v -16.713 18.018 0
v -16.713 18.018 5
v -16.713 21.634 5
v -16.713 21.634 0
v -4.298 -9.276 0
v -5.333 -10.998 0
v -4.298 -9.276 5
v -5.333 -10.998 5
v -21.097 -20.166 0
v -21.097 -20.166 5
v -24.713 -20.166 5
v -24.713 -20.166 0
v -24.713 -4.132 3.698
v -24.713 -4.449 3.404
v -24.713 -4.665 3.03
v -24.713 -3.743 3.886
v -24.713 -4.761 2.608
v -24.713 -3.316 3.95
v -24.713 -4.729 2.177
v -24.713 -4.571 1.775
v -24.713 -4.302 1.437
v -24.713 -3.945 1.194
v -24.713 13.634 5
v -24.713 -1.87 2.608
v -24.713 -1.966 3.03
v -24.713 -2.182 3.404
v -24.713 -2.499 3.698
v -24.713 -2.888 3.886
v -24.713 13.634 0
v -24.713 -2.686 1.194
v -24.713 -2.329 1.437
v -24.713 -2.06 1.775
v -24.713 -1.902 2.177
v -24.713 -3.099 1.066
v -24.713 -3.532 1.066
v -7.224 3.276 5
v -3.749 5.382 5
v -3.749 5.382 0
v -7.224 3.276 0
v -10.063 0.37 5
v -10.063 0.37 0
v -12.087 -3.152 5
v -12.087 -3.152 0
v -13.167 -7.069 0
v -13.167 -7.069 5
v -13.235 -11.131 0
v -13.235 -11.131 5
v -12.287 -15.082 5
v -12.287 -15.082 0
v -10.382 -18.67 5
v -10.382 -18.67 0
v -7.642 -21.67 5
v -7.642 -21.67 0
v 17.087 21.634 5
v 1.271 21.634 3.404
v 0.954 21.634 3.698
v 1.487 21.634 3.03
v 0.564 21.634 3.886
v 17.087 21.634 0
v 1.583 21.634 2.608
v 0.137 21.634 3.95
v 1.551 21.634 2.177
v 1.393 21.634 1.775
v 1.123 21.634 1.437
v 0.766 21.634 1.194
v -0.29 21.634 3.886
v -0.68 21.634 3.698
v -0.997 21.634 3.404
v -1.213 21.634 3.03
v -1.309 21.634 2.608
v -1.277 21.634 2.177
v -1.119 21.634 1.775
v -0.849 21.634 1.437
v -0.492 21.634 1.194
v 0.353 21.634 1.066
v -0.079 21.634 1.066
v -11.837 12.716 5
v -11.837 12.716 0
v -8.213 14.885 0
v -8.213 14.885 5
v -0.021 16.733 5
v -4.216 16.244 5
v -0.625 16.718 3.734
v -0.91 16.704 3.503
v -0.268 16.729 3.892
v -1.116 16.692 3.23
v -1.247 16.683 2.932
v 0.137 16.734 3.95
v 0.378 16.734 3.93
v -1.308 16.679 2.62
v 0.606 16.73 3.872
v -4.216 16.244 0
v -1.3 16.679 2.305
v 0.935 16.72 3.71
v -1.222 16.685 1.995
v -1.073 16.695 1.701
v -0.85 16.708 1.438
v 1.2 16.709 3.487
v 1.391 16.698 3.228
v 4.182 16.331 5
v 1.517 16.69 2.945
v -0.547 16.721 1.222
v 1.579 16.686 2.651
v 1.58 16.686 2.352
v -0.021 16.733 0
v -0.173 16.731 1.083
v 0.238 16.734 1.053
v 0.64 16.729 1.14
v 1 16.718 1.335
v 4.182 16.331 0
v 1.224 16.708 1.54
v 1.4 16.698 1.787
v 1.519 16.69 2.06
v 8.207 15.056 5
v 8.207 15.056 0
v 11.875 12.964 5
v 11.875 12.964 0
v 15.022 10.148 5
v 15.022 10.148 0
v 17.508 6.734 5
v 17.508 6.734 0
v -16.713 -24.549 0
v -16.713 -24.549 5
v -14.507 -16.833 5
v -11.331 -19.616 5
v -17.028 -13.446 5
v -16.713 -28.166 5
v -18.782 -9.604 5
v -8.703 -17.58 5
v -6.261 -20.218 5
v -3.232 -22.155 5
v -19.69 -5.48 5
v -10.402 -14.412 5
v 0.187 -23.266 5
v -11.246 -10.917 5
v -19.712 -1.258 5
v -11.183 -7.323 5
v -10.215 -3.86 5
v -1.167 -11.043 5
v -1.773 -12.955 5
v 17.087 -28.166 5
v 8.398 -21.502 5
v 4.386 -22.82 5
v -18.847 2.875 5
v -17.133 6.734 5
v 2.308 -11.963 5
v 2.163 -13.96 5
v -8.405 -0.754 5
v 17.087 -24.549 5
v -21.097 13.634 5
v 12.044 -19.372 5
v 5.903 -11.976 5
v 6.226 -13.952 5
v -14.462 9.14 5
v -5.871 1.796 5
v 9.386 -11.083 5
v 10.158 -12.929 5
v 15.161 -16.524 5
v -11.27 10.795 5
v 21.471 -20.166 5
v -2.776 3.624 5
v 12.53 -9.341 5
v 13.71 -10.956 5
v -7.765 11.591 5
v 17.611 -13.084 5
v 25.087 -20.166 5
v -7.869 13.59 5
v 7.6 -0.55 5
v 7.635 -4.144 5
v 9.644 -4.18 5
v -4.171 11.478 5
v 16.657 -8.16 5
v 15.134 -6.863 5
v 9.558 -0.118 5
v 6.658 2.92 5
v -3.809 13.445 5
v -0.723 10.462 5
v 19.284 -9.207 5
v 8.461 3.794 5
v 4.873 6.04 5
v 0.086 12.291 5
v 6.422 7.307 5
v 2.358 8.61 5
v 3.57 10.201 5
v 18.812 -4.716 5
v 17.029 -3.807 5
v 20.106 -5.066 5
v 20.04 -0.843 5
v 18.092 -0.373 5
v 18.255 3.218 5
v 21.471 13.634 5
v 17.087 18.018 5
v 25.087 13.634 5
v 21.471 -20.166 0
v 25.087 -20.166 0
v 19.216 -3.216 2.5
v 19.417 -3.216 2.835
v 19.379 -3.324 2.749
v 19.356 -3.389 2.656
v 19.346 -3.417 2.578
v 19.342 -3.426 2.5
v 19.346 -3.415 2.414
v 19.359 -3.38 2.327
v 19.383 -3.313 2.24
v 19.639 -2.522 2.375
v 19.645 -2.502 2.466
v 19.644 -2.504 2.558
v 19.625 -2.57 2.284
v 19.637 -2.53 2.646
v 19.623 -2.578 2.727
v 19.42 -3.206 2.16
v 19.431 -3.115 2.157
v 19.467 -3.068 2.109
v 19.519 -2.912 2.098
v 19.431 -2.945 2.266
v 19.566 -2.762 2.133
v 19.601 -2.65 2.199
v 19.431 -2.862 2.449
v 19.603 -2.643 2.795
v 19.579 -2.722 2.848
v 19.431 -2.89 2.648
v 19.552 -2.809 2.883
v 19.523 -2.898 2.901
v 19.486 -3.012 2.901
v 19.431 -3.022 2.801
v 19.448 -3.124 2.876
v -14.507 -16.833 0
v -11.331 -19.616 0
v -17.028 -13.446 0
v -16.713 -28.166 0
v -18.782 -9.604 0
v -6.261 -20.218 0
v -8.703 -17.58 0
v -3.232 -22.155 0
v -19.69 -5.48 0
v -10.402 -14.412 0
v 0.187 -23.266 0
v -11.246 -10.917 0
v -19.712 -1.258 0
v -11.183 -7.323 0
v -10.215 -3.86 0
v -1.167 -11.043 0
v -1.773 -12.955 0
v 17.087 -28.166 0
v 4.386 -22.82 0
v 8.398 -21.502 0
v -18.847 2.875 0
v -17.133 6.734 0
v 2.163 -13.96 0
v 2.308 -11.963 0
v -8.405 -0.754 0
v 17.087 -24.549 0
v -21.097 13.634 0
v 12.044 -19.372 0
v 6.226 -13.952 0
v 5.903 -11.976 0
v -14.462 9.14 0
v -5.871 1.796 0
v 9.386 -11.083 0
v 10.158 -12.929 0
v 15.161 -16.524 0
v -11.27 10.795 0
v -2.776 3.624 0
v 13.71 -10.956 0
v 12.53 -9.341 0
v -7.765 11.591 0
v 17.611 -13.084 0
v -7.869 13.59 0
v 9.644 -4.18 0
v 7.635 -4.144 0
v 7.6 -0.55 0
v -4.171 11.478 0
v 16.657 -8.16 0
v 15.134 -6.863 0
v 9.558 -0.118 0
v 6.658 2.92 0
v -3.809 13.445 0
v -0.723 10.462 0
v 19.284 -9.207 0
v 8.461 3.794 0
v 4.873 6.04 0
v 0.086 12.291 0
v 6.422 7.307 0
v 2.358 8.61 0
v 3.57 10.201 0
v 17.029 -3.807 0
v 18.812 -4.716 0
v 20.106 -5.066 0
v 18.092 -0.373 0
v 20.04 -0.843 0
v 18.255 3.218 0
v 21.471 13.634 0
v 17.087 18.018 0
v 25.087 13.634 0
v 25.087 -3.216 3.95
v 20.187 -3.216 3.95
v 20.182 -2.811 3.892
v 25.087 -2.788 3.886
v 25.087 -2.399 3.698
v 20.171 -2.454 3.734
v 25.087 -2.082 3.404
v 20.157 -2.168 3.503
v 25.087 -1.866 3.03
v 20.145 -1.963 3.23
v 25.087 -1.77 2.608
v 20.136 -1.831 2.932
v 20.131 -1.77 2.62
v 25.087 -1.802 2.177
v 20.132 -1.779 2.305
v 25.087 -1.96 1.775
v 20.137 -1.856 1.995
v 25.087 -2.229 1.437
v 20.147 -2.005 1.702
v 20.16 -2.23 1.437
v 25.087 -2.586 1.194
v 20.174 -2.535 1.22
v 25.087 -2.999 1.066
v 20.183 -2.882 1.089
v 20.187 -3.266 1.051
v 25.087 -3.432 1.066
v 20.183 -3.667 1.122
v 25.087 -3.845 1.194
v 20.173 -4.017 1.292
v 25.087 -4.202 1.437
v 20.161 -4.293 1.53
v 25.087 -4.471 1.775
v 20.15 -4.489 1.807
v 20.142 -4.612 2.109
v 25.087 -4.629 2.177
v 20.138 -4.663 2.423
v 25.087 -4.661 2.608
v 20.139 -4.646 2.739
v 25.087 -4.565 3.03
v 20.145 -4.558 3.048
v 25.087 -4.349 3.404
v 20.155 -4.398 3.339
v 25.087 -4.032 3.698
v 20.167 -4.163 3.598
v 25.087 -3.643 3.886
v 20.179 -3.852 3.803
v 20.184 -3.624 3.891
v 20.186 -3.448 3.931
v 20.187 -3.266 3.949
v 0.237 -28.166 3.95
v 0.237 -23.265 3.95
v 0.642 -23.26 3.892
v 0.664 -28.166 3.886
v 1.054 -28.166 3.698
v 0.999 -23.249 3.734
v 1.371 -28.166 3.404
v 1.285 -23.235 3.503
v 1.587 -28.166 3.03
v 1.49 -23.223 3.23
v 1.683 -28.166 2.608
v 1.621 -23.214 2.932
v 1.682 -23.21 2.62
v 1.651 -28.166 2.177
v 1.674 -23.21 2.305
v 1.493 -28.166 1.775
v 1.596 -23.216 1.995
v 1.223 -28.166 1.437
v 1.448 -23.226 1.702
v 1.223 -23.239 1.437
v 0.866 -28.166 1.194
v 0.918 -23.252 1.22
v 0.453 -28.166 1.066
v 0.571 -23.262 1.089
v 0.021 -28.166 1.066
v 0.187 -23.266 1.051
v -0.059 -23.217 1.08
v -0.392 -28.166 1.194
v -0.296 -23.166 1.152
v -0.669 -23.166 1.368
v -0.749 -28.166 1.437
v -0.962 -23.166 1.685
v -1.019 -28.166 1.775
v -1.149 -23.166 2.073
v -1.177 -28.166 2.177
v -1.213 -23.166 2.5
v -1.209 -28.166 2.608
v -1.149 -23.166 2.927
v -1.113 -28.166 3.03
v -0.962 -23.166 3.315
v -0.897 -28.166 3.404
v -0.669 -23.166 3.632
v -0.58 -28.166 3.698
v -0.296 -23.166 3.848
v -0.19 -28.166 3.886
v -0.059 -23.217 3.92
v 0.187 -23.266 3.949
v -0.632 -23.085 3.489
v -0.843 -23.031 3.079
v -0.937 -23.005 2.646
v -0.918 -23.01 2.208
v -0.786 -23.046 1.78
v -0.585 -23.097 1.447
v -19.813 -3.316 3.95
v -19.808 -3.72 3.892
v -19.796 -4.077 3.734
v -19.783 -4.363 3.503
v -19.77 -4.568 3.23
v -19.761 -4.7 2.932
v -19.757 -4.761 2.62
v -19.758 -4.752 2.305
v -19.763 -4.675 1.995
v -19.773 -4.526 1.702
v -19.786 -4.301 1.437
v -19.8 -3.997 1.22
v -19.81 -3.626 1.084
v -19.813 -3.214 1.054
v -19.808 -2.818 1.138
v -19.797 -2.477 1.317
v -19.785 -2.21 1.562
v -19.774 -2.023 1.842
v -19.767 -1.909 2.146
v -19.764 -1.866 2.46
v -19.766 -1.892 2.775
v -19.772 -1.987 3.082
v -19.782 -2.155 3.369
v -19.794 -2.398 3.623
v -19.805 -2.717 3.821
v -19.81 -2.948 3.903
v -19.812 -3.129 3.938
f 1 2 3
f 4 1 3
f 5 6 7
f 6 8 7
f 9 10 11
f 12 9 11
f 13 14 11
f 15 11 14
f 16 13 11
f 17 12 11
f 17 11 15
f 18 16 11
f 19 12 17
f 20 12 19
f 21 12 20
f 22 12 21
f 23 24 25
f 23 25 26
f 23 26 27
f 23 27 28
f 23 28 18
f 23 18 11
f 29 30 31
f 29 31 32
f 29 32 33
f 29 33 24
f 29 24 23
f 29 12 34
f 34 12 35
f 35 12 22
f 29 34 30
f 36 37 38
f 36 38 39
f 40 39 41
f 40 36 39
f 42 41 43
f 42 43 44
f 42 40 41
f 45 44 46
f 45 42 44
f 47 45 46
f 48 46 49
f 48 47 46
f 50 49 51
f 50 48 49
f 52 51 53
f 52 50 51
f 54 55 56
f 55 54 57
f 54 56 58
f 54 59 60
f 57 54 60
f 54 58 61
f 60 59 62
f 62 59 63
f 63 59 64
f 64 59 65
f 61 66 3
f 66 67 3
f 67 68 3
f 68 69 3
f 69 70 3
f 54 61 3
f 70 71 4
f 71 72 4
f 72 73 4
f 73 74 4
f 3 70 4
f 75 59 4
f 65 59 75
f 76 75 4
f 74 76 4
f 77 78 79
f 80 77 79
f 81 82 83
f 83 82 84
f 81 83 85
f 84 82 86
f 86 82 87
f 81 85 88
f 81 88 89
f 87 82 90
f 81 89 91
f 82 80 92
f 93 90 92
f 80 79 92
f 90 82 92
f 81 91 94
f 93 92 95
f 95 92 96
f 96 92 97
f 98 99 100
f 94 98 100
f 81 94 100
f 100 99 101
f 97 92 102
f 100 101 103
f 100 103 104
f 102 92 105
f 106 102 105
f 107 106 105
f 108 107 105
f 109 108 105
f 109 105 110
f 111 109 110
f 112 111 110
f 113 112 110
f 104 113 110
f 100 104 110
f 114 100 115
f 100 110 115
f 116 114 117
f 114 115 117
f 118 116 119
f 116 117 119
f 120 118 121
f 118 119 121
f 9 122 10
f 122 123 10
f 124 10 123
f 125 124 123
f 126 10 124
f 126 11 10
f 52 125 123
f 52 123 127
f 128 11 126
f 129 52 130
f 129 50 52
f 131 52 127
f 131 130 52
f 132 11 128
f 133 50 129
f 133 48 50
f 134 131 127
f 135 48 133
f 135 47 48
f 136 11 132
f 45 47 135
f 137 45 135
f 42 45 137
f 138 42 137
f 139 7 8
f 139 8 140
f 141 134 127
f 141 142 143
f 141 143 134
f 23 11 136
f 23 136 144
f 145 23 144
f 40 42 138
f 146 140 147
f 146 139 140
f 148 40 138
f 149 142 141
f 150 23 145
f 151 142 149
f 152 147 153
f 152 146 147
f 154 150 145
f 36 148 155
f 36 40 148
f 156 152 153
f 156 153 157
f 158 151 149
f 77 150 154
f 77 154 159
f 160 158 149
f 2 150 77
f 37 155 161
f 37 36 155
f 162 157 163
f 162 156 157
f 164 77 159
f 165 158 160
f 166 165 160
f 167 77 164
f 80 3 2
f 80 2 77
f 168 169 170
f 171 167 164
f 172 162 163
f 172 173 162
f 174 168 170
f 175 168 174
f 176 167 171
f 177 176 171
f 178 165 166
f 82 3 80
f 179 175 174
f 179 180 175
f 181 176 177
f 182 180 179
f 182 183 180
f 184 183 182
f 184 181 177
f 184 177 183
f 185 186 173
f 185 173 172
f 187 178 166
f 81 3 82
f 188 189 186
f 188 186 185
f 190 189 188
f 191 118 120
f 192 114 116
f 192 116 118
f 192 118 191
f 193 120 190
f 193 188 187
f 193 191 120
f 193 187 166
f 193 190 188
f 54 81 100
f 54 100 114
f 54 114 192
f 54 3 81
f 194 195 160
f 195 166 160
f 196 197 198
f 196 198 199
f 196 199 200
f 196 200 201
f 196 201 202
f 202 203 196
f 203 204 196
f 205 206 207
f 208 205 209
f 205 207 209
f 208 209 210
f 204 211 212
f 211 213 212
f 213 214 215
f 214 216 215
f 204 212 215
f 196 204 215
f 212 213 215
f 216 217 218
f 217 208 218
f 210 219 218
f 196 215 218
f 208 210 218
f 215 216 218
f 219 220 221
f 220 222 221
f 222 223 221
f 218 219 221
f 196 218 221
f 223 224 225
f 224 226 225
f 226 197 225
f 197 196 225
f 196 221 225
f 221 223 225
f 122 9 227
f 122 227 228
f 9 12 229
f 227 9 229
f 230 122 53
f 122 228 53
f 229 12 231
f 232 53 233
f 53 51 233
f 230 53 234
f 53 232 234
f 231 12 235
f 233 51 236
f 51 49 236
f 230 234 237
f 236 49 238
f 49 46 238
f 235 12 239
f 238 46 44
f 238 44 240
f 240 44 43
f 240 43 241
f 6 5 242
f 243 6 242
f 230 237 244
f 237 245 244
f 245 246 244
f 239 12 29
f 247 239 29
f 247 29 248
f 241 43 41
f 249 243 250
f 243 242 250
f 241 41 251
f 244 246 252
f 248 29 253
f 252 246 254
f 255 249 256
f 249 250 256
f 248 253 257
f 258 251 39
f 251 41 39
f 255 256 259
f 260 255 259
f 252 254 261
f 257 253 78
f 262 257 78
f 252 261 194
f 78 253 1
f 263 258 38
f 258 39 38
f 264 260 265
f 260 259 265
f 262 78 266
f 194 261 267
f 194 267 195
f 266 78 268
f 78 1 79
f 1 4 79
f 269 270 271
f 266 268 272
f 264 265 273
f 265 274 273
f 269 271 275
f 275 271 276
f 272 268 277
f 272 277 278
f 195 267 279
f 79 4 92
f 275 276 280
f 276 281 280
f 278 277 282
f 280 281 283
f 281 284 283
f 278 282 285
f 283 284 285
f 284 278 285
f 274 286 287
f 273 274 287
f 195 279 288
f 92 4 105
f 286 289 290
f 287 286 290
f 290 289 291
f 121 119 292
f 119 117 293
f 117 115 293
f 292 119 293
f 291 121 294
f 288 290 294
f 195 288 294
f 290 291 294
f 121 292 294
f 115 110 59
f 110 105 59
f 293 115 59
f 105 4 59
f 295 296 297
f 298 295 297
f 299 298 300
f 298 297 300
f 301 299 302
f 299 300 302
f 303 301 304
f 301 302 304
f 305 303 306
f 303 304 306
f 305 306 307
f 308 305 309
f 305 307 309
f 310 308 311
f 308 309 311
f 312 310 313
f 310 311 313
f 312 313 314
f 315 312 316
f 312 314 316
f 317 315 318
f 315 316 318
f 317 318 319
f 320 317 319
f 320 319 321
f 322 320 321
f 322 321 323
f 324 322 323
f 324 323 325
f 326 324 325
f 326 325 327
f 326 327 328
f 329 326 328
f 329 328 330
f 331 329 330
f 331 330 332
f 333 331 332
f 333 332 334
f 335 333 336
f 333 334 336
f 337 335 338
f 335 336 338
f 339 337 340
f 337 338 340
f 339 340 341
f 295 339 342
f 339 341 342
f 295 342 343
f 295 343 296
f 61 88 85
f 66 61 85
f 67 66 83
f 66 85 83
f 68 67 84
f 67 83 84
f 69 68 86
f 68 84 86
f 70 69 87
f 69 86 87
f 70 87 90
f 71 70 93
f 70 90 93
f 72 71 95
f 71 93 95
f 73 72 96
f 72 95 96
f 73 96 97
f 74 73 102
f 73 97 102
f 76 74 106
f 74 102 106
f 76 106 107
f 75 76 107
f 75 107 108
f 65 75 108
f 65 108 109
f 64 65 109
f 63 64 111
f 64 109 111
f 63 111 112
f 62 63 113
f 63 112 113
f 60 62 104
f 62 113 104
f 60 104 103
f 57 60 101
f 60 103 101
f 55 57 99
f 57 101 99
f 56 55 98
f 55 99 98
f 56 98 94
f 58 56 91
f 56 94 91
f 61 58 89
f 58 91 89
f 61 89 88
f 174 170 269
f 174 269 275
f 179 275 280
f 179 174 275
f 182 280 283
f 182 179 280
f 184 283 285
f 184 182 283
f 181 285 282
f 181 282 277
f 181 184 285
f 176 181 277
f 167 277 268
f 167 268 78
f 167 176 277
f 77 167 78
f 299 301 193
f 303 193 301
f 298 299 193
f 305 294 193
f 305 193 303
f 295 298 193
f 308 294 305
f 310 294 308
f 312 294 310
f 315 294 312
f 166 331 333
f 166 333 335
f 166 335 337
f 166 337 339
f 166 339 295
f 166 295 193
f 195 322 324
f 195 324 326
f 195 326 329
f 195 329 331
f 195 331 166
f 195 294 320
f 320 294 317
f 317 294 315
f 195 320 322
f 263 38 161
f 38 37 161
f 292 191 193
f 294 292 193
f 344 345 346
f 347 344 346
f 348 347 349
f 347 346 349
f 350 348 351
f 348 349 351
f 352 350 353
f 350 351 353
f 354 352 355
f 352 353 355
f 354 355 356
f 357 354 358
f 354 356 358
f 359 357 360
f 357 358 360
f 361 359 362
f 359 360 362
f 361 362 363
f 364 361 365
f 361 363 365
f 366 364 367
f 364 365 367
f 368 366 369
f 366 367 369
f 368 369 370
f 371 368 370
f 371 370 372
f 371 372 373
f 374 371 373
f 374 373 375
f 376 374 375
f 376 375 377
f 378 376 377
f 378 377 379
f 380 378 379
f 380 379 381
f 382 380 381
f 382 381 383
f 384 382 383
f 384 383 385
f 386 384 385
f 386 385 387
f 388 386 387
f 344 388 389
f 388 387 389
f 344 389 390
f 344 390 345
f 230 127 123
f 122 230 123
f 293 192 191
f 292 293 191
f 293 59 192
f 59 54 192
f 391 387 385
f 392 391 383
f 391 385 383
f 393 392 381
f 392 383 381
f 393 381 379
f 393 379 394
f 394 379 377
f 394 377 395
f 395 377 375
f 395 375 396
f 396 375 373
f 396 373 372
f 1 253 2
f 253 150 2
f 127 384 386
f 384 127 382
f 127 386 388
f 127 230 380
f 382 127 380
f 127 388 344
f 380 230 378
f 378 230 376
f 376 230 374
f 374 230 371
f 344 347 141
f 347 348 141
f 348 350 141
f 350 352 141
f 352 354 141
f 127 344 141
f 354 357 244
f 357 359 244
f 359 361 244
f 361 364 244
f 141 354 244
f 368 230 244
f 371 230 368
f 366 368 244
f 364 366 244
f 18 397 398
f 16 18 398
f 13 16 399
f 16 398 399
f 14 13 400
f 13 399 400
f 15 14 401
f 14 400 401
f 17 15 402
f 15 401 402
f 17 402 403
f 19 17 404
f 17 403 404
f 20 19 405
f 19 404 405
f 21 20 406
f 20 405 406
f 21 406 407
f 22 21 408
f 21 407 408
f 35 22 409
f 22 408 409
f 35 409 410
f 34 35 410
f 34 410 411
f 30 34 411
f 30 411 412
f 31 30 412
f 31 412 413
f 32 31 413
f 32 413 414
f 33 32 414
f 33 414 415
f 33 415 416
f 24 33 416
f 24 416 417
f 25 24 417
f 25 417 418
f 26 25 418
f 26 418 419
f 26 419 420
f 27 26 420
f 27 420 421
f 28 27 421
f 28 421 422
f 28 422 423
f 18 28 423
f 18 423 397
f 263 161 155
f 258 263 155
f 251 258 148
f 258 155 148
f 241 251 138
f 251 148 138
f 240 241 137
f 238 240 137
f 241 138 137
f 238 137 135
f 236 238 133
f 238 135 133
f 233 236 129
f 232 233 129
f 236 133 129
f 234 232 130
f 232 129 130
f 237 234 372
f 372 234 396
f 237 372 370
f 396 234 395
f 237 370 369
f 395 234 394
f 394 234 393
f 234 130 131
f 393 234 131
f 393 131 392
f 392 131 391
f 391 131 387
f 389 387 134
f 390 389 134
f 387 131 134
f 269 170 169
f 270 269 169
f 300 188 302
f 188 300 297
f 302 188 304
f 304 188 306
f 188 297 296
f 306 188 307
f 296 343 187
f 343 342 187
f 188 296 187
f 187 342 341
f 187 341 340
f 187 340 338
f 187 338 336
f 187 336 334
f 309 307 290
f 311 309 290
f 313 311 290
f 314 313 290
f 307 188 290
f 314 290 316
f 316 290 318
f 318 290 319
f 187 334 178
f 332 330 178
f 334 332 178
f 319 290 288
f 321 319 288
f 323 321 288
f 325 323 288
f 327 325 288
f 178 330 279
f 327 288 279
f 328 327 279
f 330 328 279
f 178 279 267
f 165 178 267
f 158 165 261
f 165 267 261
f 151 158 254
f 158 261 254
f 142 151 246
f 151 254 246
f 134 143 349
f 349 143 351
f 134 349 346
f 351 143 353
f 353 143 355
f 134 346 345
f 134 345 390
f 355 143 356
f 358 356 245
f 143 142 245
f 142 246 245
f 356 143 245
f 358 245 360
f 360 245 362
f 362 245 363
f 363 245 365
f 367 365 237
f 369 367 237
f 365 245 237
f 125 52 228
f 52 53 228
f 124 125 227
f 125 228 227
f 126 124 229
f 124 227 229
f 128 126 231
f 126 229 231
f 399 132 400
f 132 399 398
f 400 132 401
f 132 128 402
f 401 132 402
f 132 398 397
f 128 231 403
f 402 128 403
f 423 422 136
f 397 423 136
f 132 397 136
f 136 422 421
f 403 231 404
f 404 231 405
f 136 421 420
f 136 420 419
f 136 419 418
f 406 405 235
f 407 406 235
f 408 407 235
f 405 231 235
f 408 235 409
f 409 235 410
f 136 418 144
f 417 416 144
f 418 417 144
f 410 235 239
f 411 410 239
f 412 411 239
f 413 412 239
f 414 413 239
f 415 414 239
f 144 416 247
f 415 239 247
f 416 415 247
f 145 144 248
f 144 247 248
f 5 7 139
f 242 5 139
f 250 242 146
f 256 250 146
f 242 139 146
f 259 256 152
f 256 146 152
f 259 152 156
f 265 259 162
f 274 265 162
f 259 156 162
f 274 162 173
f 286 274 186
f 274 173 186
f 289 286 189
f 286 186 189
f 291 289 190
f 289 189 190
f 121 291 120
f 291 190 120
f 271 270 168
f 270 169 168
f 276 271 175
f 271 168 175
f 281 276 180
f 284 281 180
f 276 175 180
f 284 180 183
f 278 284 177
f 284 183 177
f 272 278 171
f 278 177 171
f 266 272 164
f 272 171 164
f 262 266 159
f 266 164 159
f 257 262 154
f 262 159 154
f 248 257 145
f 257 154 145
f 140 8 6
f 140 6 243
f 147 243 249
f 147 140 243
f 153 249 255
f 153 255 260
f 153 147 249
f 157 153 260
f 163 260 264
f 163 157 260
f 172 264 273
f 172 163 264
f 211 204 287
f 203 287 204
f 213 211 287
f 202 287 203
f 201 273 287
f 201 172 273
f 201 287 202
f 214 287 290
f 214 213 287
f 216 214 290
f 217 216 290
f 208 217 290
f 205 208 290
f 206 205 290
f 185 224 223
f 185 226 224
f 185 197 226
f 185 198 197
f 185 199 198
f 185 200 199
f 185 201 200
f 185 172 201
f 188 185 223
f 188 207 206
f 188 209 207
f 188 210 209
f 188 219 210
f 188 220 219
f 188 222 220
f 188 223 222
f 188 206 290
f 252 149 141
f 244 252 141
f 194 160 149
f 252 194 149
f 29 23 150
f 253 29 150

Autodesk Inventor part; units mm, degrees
ref_plane "YZ Plane" through (0, 0, 0) normal (1, 0, 0) x (0, 1, 0)
ref_plane "XZ Plane" through (0, 0, 0) normal (0, 1, 0) x (-1, 0, 0)
ref_plane "XY Plane" through (0, 0, 0) normal (0, 0, 1) x (1, 0, 0)
sketch "Sketch1" plane through (0, 0, 0) normal (0, 0, 1) x (1, 0, 0)
  line L0 (21.5871, 13.6345) -> (17.0871, 18.1345) projected
  line L1 (17.0871, 18.1345) -> (-16.7129, 18.1345) projected
  line L2 (-16.7129, 18.1345) -> (-21.2129, 13.6345) projected
  line L3 (-21.0966, 13.6345) -> (-21.0966, -20.1655) projected
  line L4 (21.4709, -20.1655) -> (21.4709, 13.6345) projected
  line L5 (21.4709, -20.1655) -> (17.0871, -24.4078) projected
  line L6 (-16.7129, -24.4078) -> (17.0871, -24.4078) projected
  line L7 (-16.7129, -24.4078) -> (-21.0966, -20.1655) projected
  line L8 (-24.7129, -28.1655) -> (-24.7129, 13.6345) construction
  line L9 (25.0871, -28.1655) -> (-24.7129, -28.1655) construction
  line L10 (25.0871, -28.1655) -> (25.0871, 13.6345) construction
  line L11 (17.0871, 21.6345) -> (-16.7129, 21.6345) construction
  line L12 (0.1871, -36.5255) -> (0.1871, 21.9945)
  line L13 (-21.0552, -20.0655) -> (-16.6129, -24.5078)
  line L14 (-16.6129, -24.5078) -> (-16.6129, -28.1655)
  line L15 (-16.6129, -28.1655) -> (16.9871, -28.1655)
  line L16 (16.9871, -28.1655) -> (16.9871, -24.5078)
  line L17 (16.9871, -24.5078) -> (21.4295, -20.0655)
  line L18 (25.0871, -20.0655) -> (21.4295, -20.0655)
  line L19 (25.0871, 13.5345) -> (25.0871, -20.0655)
  line L20 (21.4295, 13.5345) -> (25.0871, 13.5345)
  line L21 (21.4295, 13.5345) -> (16.9871, 17.9768)
  line L22 (16.9871, 17.9768) -> (16.9871, 21.6345)
  line L23 (16.9871, 21.6345) -> (-16.6129, 21.6345)
  line L24 (-16.6129, 21.6345) -> (-16.6129, 17.9768)
  line L25 (-16.6129, 17.9768) -> (-21.0552, 13.5345)
  line L26 (-24.7129, 13.5345) -> (-21.0552, 13.5345)
  line L27 (-24.7129, -20.0655) -> (-24.7129, 13.5345)
  line L28 (-21.0552, -20.0655) -> (-24.7129, -20.0655)
  circle A0 centre (0.1871, -3.2655) radius 12.5 construction
  circle A1 centre (0.1871, -3.2655) radius 16.9 construction
  circle A2 centre (0.1871, -3.2655) radius 7.5 construction
  line L29 (0.547, -12.2476) -> (0.8041, -10.7401)
  arc A3 (-10.8411, 9.29) -> (0.8041, -10.7401) centre (-0.9086, 1.6644) ccw
  arc A4 (-14.6035, 4.5126) -> (0.547, -12.2476) centre (-0.9086, 1.6644) ccw
  arc A5 (-5.1721, -19.094) -> (6.3518, 1.0061) centre (-3.5344, -6.6794) ccw
  arc A6 (0.8464, -19.9636) -> (7.786, 1.5372) centre (-3.5344, -6.6794) ccw
  line L30 (7.786, 1.5372) -> (6.3518, 1.0061)
  arc A7 (16.5746, 0.0075) -> (-6.5945, -0.0625) centre (5.0044, -4.7815) ccw
  arc A8 (14.3185, 5.6545) -> (-7.7715, 0.914) centre (5.0044, -4.7815) ccw
  line L31 (-7.7715, 0.914) -> (-6.5945, -0.0625)
  arc A9 (0.1871, -19.9766) -> (0.8464, -19.9636) centre (0.211, -4.4767) ccw
  arc A10 (-12.8462, 5.1239) -> (-13.1888, 4.5662) centre (0.1871, -3.2655) ccw
  arc A11 (-12.8462, 5.1239) -> (-13.1888, 4.5662) centre (0.1871, -3.2655) ccw
  arc A12 (14.3185, 5.6545) -> (-10.8411, 9.29) centre (0.1871, -3.2655) ccw construction
  arc A13 (14.3185, 5.6545) -> (-10.8411, 9.29) centre (0.1871, -3.2655) ccw
  arc A14 (-14.6035, 4.5126) -> (-5.1721, -19.094) centre (0.1871, -3.2655) ccw construction
  arc A15 (0.1871, -19.9766) -> (16.5746, 0.0075) centre (0.1871, -3.2655) ccw construction
  arc A16 (-14.6035, 4.5126) -> (-5.1721, -19.094) centre (0.1871, -3.2655) ccw
  arc A17 (0.1871, -19.9766) -> (16.5746, 0.0075) centre (0.1871, -3.2655) ccw
  circle A18 centre (0.1871, -3.2655) radius 20
  point P0 (14.2, -44.8454)
  point P1 (16.9871, 19.8057)
  dimension "d49" = 15
  dimension "d48" = 25
  dimension "d53" = 360
  dimension "d61" = 40
extrude "Extrusion1" add sketch "Sketch1" along normal blind 5 contours L22 L21 L20 L4 L18 L17 L6 L12 A18 L1 | L1 L12 L23 L22 | L12 A18 L6 L13 L28 L3 L26 L25 L24 L1 | L1 L24 L23 L12 | L20 L19 L18 L4 | L12 L15 L14 L13 L6 | L6 L17 L16 L15 L12 | L3 L28 L27 L26
sketch "Sketch3" plane through (0, 0, 5) normal (0, 0, 1) x (1, 0, 0)
  circle A0 centre (0.1871, -3.2655) radius 20 projected
  circle A1 centre (0.1871, -3.2655) radius 7.5 construction
  arc A2 (-2.7759, 3.6244) -> (0.1871, -23.2655) centre (2.8116, -9.3681) ccw
  arc A3 (-3.7493, 5.3815) -> (-7.6417, -21.6695) centre (2.8116, -9.3681) ccw
  line L0 (-3.7493, 5.3815) -> (-2.7759, 3.6244)
  arc A4 (-7.6417, -21.6695) -> (0.1871, -23.2655) centre (0.1871, -3.2655) ccw
  point P0 (0, 0)
  dimension "d55" = 15
  dimension "d62" = 2
extrude "Extrusion3" add sketch "Sketch3" against normal up to surface (5 mm away) contours A3 L0 A2 A0 picked at (-8.119, 1.4619)
pattern_circular "Circular Pattern1" count 3 over 360 about axis through (0.1871, -3.2655, 0) along (0, 0, 1) of "Extrusion3"
sketch "Sketch4" plane through (-24.7129, -20.0655, 0) normal (-1, 0, 0) x (0, 0, 1)
  line L0 (0, 41.7) -> (5, 41.7) projected
  point P0 (0, 20.0655)
  point P1 (2.5, 16.75)
  dimension "d63" = 24.95
hole "Hole1" at (-24.7129, -3.3155, 2.5) direction (1, 0, 0) diameter 2.9 depth 5 tip angle 118
pattern_circular "Circular Pattern2" count 4 over 360 about axis through (0.1871, -3.2655, 0) along (0, 0, 1) of "Hole1"
sketch "Skizze5" plane through (0, 0, 5) normal (0, 0, 1) x (1, 0, 0)
  arc A0 (-17.1334, 6.7345) -> (-7.6417, -21.6695) centre (0.1871, -3.2655) ccw construction
  arc A1 (7.6355, -4.1444) -> (-17.1334, 6.7345) centre (-6.4101, -2.487) ccw construction
  line L0 (7.6355, -4.1444) -> (9.6439, -4.1799) construction
  arc A2 (9.6439, -4.1799) -> (-11.8368, 12.7165) centre (-6.4101, -2.487) ccw construction
  arc A3 (17.5076, 6.7345) -> (-11.8368, 12.7165) centre (0.1871, -3.2655) ccw construction
  arc A4 (-4.2982, -9.2765) -> (17.5076, 6.7345) centre (4.1599, 2.0586) ccw construction
  line L1 (-4.2982, -9.2765) -> (-5.3332, -10.9981) construction
  arc A5 (-5.3332, -10.9981) -> (20.0399, -0.8435) centre (4.1599, 2.0586) ccw construction
  arc A6 (0.1871, -23.2655) -> (20.0399, -0.8435) centre (0.1871, -3.2655) ccw construction
  arc A7 (-2.7759, 3.6244) -> (0.1871, -23.2655) centre (2.8116, -9.3681) ccw construction
  line L2 (-2.7759, 3.6244) -> (-3.7493, 5.3815) construction
  arc A8 (-3.7493, 5.3815) -> (-7.6417, -21.6695) centre (2.8116, -9.3681) ccw construction
  line L3 (-21.0552, -20.0655) -> (-16.6129, -24.5078) projected
  line L4 (-16.6129, -24.5078) -> (-16.6129, -28.1655) projected
  line L5 (-16.6129, -28.1655) -> (16.9871, -28.1655) construction
  line L6 (16.9871, -28.1655) -> (16.9871, -24.5078) projected
  line L7 (16.9871, -24.5078) -> (21.4295, -20.0655) projected
  line L8 (21.4295, -20.0655) -> (25.0871, -20.0655) projected
  line L9 (25.0871, -20.0655) -> (25.0871, 13.5345) construction
  line L10 (25.0871, 13.5345) -> (21.4295, 13.5345) projected
  line L11 (21.4295, 13.5345) -> (16.9871, 17.9768) projected
  line L12 (16.9871, 17.9768) -> (16.9871, 21.6345) projected
  line L13 (16.9871, 21.6345) -> (-16.6129, 21.6345) construction
  line L14 (-16.6129, 21.6345) -> (-16.6129, 17.9768) projected
  line L15 (-16.6129, 17.9768) -> (-21.0552, 13.5345) projected
  line L16 (-21.0552, 13.5345) -> (-24.7129, 13.5345) projected
  line L17 (-24.7129, 13.5345) -> (-24.7129, -20.0655) construction
  line L18 (-24.7129, -20.0655) -> (-21.0552, -20.0655) projected
  line L19 (-16.7129, 21.7345) -> (17.0871, 21.7345) construction
  line L20 (17.0871, 21.7345) -> (17.0871, 18.0183)
  line L21 (17.0871, 18.0183) -> (21.4709, 13.6345)
  line L22 (21.4709, 13.6345) -> (25.1871, 13.6345)
  line L23 (25.1871, 13.6345) -> (25.1871, -20.1655) construction
  line L24 (25.1871, -20.1655) -> (21.4709, -20.1655)
  line L25 (21.4709, -20.1655) -> (17.0871, -24.5493)
  line L26 (17.0871, -24.5493) -> (17.0871, -28.2655)
  line L27 (17.0871, -28.2655) -> (-16.7129, -28.2655) construction
  line L28 (-16.7129, -28.2655) -> (-16.7129, -24.5493)
  line L29 (-16.7129, -24.5493) -> (-21.0966, -20.1655)
  line L30 (-21.0966, -20.1655) -> (-24.8129, -20.1655)
  line L31 (-24.8129, -20.1655) -> (-24.8129, 13.6345) construction
  line L32 (-24.8129, 13.6345) -> (-21.0966, 13.6345)
  line L33 (-21.0966, 13.6345) -> (-16.7129, 18.0183)
  line L34 (-16.7129, 18.0183) -> (-16.7129, 21.7345)
  line L35 (-24.7129, 13.5345) -> (-24.7129, 13.6345)
  line L36 (-16.6129, 21.6345) -> (-16.7129, 21.6345)
  line L37 (16.9871, 21.6345) -> (17.0871, 21.6345)
  line L38 (25.0871, 13.5345) -> (25.0871, 13.6345)
  line L39 (25.0871, -20.0655) -> (25.0871, -20.1655)
  line L40 (16.9871, -28.1655) -> (17.0871, -28.1655)
  line L41 (-16.6129, -28.1655) -> (-16.7129, -28.1655)
  line L42 (-24.7129, -20.0655) -> (-24.7129, -20.1655)
  point P0 (0, 0)
  dimension "d74" = 0.1
extrude "IM_offset" add sketch "Skizze5" against normal up to surface (5 mm away)
properties part number "20_Cube_Insert_Laser_Holder_v2"
